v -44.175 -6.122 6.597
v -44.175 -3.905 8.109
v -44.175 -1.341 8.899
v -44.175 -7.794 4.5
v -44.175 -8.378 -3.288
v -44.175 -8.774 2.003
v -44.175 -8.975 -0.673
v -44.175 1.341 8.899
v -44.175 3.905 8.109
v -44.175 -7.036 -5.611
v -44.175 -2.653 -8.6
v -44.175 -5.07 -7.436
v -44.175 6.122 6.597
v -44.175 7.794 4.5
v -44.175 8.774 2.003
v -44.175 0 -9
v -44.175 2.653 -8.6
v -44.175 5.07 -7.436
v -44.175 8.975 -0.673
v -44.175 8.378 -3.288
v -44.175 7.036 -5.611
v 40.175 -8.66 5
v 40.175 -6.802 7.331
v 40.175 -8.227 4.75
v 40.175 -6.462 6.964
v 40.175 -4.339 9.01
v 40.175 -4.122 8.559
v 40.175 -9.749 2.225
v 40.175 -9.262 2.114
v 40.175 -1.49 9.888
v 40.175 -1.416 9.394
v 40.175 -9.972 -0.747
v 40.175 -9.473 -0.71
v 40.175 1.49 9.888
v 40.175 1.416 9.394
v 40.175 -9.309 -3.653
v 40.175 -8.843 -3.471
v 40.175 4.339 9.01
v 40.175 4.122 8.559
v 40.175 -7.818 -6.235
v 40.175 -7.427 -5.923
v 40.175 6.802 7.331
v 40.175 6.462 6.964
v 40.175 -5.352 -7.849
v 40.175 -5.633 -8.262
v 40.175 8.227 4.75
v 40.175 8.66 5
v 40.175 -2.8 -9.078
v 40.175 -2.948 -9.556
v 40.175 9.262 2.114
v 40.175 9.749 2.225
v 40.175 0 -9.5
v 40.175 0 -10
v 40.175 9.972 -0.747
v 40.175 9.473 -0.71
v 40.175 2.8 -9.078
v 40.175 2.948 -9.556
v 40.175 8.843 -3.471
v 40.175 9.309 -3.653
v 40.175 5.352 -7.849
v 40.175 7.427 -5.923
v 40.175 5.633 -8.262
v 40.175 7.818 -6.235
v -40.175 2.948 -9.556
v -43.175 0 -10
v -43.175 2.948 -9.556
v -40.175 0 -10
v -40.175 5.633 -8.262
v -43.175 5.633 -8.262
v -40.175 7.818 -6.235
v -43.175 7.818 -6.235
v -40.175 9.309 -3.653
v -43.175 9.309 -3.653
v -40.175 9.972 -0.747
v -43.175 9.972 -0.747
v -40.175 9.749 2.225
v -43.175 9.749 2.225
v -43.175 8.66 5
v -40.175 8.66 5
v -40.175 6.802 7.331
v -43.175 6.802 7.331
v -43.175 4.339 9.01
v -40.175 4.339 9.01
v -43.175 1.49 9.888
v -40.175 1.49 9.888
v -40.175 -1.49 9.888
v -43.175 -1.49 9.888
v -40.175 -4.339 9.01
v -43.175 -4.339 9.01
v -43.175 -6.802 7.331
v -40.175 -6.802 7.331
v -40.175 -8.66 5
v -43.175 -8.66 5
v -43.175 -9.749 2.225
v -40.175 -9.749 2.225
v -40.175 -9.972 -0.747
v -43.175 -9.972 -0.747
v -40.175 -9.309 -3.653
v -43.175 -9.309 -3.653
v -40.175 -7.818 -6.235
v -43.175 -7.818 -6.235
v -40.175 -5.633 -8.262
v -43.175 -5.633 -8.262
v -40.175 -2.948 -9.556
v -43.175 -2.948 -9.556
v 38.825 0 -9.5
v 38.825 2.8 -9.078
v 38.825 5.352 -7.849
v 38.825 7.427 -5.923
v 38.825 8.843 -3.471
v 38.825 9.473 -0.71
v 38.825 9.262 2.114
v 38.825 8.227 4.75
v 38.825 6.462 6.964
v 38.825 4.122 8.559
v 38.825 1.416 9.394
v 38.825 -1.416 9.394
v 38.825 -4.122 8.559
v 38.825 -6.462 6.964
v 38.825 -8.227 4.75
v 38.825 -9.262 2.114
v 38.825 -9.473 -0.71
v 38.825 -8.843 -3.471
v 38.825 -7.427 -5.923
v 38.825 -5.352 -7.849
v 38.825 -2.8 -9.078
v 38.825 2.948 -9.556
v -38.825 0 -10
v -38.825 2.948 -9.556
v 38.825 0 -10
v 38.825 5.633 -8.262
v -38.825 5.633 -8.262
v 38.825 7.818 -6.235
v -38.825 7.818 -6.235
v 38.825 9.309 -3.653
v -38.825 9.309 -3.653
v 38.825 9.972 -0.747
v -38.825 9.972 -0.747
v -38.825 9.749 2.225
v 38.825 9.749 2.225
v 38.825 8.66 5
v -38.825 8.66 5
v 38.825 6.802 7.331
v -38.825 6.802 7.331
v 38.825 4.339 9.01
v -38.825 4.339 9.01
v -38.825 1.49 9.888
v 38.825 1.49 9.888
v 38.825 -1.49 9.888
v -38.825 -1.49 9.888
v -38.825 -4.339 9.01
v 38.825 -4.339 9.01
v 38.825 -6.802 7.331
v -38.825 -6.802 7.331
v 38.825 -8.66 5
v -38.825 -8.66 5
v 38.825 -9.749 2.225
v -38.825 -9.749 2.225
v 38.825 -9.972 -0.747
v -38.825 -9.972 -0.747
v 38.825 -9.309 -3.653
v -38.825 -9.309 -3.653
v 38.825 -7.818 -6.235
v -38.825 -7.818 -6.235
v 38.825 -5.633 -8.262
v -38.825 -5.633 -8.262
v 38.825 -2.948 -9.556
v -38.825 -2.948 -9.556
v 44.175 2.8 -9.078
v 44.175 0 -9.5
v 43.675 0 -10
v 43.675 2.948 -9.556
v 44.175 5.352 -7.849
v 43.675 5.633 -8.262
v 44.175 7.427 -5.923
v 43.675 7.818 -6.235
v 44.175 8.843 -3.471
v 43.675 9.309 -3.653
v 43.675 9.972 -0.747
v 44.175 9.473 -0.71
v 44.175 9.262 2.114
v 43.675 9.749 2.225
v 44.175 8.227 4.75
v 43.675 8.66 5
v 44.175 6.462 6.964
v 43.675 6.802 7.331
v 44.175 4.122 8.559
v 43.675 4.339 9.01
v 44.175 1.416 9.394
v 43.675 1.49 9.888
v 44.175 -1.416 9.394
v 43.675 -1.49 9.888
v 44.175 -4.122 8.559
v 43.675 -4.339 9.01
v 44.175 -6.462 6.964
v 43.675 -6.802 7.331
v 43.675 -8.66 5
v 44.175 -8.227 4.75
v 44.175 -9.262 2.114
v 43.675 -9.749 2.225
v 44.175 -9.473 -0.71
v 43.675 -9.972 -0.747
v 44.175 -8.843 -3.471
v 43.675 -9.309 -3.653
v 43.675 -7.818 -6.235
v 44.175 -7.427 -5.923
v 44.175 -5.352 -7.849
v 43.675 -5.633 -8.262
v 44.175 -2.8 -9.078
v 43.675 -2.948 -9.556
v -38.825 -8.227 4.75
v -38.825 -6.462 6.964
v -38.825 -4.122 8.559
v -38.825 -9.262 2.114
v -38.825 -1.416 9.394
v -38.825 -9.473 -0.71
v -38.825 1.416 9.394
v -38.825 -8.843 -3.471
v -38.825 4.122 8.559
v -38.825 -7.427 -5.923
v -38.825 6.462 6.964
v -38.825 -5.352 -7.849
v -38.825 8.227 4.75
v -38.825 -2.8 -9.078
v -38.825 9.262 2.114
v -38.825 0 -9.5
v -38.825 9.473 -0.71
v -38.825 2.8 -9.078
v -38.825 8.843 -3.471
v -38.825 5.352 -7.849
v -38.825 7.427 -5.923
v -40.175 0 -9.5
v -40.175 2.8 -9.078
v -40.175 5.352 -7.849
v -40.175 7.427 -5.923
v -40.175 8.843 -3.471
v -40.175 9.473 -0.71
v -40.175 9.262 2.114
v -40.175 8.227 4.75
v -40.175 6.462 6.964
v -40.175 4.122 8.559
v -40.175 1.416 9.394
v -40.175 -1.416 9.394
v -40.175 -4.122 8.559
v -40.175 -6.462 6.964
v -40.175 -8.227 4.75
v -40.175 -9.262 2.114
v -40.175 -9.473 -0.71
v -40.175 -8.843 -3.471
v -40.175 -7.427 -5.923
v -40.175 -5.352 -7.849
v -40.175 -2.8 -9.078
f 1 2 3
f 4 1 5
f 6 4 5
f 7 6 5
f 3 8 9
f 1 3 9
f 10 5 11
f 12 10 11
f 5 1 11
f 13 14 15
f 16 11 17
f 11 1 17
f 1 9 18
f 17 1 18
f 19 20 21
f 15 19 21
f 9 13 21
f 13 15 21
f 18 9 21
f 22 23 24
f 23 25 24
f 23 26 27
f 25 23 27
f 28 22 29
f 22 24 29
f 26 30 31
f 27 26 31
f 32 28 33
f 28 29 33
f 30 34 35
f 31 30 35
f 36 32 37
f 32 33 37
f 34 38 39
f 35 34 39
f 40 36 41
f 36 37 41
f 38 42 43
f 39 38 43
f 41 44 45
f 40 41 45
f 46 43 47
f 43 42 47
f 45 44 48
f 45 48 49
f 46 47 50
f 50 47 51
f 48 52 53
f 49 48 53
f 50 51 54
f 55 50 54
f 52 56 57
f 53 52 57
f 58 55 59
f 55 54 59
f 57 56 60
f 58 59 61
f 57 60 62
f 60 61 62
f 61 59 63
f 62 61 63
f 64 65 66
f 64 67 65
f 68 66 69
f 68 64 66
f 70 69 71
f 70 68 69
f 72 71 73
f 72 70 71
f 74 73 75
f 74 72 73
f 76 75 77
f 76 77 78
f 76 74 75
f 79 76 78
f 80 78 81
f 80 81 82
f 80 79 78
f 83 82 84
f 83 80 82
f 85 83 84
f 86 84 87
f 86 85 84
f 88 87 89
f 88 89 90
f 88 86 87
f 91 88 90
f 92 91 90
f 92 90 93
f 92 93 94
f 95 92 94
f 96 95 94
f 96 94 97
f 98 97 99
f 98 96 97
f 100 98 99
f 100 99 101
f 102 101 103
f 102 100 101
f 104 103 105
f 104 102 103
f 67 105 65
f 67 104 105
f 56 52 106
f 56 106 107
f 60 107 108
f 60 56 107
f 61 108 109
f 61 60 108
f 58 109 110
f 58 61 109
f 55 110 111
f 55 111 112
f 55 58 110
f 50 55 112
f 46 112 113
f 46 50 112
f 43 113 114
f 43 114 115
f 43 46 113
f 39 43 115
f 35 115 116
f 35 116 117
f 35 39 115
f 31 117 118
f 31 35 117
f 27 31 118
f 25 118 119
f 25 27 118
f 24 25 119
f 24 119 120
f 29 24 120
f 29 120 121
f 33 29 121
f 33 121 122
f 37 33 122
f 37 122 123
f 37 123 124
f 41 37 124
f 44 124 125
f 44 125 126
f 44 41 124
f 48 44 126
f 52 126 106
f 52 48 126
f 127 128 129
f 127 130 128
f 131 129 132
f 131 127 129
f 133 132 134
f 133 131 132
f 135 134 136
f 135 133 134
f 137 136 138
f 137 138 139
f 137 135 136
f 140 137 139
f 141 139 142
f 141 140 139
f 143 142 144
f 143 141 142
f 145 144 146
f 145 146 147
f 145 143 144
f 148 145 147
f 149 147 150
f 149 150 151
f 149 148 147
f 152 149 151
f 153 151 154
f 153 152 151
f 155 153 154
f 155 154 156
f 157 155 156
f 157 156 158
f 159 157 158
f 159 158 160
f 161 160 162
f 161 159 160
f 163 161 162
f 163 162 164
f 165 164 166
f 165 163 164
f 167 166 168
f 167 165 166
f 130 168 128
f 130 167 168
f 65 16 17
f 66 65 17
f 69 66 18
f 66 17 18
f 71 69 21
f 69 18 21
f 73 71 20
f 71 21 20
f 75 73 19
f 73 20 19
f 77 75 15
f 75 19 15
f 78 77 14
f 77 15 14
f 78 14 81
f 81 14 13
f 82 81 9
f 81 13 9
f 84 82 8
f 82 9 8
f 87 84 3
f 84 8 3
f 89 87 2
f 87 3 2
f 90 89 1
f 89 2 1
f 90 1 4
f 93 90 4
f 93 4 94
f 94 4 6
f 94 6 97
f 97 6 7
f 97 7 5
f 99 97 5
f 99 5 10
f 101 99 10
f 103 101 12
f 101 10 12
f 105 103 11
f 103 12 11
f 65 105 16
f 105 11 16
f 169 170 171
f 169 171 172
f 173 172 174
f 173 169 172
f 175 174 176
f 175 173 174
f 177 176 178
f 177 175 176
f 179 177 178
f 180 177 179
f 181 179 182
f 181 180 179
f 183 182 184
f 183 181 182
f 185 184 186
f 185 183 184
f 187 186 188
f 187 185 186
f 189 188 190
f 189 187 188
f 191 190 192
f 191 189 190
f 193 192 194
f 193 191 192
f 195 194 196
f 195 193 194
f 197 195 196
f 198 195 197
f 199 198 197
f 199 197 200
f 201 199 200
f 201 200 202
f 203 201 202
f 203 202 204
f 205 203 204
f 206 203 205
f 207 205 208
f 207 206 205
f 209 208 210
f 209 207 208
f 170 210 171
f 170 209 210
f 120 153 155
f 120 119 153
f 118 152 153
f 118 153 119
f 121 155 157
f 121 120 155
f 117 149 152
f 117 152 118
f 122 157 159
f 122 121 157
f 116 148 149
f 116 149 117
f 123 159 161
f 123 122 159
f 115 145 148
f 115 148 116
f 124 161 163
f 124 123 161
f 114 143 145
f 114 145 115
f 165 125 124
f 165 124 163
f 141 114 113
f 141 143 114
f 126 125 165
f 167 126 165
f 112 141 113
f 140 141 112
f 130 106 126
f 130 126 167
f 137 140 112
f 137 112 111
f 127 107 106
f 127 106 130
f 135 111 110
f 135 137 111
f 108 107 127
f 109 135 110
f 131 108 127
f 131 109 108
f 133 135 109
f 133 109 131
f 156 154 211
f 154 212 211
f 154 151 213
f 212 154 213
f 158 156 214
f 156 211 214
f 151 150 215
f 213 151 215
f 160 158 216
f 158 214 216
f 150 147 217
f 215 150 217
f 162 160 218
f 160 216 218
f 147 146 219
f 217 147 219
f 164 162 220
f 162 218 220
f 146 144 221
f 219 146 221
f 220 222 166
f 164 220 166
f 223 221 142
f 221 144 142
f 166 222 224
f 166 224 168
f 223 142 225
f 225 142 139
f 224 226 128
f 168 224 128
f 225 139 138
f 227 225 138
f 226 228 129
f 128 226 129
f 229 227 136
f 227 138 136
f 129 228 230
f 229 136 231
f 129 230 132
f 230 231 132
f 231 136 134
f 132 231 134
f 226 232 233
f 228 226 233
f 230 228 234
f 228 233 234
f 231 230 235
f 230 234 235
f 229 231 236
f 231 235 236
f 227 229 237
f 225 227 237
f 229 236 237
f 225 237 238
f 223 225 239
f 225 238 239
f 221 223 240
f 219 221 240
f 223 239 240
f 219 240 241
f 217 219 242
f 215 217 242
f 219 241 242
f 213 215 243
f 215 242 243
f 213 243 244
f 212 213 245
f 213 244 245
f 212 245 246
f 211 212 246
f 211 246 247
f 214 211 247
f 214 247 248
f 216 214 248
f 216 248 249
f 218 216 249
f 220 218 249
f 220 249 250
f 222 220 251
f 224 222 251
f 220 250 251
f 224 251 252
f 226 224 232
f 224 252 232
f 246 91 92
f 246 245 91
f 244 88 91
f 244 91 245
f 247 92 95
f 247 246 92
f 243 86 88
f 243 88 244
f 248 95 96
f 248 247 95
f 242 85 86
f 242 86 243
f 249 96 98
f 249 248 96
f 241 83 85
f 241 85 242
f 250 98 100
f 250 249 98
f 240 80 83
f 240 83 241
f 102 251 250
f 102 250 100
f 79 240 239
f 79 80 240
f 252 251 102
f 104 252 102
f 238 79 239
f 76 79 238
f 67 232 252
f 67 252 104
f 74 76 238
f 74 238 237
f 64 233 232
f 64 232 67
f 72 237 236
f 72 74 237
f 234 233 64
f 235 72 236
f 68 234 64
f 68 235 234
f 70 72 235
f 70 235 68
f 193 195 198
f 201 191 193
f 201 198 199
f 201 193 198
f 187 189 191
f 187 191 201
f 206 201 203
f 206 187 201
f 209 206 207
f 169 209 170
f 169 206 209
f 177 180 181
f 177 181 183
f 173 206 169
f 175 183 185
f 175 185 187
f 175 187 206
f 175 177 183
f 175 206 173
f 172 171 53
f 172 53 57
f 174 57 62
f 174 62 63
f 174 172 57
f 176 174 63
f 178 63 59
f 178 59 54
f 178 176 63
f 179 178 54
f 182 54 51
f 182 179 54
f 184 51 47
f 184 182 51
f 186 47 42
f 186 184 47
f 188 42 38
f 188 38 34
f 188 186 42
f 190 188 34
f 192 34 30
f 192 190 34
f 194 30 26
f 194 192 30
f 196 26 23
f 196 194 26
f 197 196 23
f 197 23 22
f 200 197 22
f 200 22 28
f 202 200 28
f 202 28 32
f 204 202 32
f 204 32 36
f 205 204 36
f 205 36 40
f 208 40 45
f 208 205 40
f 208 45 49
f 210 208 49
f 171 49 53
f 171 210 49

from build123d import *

# Parameters (mm, degrees)
SKETCH1_R           = 10
BOSS_EXTRUDE1_DEPTH = 44.175
SKETCH2_R           = 10
SKETCH2_R_2         = 9.5
CUT_EXTRUDE1_DEPTH  = 1.35
CHAMFER1_SIZE       = 0.5
CHAMFER2_SIZE       = 1


with BuildPart() as part:
    # Sketch1 → Boss-Extrude1 (new, symmetric)
    with BuildSketch(Plane(origin=(0, 0, 0), x_dir=(0, 0, -1), z_dir=(1, 0, 0))):
        Circle(SKETCH1_R)
    extrude(amount=BOSS_EXTRUDE1_DEPTH, both=True)

    # Sketch2 → Cut-Extrude1 (cut)
    with BuildSketch(Plane(origin=(40.175, 0, 0), x_dir=(0, 0, -1), z_dir=(1, 0, 0))):
        Circle(SKETCH2_R)
        Circle(SKETCH2_R_2, mode=Mode.SUBTRACT)
    cut_extrude1 = extrude(amount=-CUT_EXTRUDE1_DEPTH, mode=Mode.SUBTRACT)

    # Chamfer1
    chamfer1_edges = [part.edges().sort_by_distance(p)[0] for p in [
        (44.175, 0, 10),
    ]]
    chamfer(chamfer1_edges, length=CHAMFER1_SIZE)

    # Chamfer2
    chamfer2_edges = [part.edges().sort_by_distance(p)[0] for p in [
        (-44.175, 0, 10),
    ]]
    chamfer(chamfer2_edges, length=CHAMFER2_SIZE)

    # Mirror1: Cut-Extrude1 across plane
    add(cut_extrude1.mirror(Plane(origin=(0, 0, 0), x_dir=(0, 0, 1), z_dir=(1, 0, 0))), mode=Mode.SUBTRACT)


solid = part.part
